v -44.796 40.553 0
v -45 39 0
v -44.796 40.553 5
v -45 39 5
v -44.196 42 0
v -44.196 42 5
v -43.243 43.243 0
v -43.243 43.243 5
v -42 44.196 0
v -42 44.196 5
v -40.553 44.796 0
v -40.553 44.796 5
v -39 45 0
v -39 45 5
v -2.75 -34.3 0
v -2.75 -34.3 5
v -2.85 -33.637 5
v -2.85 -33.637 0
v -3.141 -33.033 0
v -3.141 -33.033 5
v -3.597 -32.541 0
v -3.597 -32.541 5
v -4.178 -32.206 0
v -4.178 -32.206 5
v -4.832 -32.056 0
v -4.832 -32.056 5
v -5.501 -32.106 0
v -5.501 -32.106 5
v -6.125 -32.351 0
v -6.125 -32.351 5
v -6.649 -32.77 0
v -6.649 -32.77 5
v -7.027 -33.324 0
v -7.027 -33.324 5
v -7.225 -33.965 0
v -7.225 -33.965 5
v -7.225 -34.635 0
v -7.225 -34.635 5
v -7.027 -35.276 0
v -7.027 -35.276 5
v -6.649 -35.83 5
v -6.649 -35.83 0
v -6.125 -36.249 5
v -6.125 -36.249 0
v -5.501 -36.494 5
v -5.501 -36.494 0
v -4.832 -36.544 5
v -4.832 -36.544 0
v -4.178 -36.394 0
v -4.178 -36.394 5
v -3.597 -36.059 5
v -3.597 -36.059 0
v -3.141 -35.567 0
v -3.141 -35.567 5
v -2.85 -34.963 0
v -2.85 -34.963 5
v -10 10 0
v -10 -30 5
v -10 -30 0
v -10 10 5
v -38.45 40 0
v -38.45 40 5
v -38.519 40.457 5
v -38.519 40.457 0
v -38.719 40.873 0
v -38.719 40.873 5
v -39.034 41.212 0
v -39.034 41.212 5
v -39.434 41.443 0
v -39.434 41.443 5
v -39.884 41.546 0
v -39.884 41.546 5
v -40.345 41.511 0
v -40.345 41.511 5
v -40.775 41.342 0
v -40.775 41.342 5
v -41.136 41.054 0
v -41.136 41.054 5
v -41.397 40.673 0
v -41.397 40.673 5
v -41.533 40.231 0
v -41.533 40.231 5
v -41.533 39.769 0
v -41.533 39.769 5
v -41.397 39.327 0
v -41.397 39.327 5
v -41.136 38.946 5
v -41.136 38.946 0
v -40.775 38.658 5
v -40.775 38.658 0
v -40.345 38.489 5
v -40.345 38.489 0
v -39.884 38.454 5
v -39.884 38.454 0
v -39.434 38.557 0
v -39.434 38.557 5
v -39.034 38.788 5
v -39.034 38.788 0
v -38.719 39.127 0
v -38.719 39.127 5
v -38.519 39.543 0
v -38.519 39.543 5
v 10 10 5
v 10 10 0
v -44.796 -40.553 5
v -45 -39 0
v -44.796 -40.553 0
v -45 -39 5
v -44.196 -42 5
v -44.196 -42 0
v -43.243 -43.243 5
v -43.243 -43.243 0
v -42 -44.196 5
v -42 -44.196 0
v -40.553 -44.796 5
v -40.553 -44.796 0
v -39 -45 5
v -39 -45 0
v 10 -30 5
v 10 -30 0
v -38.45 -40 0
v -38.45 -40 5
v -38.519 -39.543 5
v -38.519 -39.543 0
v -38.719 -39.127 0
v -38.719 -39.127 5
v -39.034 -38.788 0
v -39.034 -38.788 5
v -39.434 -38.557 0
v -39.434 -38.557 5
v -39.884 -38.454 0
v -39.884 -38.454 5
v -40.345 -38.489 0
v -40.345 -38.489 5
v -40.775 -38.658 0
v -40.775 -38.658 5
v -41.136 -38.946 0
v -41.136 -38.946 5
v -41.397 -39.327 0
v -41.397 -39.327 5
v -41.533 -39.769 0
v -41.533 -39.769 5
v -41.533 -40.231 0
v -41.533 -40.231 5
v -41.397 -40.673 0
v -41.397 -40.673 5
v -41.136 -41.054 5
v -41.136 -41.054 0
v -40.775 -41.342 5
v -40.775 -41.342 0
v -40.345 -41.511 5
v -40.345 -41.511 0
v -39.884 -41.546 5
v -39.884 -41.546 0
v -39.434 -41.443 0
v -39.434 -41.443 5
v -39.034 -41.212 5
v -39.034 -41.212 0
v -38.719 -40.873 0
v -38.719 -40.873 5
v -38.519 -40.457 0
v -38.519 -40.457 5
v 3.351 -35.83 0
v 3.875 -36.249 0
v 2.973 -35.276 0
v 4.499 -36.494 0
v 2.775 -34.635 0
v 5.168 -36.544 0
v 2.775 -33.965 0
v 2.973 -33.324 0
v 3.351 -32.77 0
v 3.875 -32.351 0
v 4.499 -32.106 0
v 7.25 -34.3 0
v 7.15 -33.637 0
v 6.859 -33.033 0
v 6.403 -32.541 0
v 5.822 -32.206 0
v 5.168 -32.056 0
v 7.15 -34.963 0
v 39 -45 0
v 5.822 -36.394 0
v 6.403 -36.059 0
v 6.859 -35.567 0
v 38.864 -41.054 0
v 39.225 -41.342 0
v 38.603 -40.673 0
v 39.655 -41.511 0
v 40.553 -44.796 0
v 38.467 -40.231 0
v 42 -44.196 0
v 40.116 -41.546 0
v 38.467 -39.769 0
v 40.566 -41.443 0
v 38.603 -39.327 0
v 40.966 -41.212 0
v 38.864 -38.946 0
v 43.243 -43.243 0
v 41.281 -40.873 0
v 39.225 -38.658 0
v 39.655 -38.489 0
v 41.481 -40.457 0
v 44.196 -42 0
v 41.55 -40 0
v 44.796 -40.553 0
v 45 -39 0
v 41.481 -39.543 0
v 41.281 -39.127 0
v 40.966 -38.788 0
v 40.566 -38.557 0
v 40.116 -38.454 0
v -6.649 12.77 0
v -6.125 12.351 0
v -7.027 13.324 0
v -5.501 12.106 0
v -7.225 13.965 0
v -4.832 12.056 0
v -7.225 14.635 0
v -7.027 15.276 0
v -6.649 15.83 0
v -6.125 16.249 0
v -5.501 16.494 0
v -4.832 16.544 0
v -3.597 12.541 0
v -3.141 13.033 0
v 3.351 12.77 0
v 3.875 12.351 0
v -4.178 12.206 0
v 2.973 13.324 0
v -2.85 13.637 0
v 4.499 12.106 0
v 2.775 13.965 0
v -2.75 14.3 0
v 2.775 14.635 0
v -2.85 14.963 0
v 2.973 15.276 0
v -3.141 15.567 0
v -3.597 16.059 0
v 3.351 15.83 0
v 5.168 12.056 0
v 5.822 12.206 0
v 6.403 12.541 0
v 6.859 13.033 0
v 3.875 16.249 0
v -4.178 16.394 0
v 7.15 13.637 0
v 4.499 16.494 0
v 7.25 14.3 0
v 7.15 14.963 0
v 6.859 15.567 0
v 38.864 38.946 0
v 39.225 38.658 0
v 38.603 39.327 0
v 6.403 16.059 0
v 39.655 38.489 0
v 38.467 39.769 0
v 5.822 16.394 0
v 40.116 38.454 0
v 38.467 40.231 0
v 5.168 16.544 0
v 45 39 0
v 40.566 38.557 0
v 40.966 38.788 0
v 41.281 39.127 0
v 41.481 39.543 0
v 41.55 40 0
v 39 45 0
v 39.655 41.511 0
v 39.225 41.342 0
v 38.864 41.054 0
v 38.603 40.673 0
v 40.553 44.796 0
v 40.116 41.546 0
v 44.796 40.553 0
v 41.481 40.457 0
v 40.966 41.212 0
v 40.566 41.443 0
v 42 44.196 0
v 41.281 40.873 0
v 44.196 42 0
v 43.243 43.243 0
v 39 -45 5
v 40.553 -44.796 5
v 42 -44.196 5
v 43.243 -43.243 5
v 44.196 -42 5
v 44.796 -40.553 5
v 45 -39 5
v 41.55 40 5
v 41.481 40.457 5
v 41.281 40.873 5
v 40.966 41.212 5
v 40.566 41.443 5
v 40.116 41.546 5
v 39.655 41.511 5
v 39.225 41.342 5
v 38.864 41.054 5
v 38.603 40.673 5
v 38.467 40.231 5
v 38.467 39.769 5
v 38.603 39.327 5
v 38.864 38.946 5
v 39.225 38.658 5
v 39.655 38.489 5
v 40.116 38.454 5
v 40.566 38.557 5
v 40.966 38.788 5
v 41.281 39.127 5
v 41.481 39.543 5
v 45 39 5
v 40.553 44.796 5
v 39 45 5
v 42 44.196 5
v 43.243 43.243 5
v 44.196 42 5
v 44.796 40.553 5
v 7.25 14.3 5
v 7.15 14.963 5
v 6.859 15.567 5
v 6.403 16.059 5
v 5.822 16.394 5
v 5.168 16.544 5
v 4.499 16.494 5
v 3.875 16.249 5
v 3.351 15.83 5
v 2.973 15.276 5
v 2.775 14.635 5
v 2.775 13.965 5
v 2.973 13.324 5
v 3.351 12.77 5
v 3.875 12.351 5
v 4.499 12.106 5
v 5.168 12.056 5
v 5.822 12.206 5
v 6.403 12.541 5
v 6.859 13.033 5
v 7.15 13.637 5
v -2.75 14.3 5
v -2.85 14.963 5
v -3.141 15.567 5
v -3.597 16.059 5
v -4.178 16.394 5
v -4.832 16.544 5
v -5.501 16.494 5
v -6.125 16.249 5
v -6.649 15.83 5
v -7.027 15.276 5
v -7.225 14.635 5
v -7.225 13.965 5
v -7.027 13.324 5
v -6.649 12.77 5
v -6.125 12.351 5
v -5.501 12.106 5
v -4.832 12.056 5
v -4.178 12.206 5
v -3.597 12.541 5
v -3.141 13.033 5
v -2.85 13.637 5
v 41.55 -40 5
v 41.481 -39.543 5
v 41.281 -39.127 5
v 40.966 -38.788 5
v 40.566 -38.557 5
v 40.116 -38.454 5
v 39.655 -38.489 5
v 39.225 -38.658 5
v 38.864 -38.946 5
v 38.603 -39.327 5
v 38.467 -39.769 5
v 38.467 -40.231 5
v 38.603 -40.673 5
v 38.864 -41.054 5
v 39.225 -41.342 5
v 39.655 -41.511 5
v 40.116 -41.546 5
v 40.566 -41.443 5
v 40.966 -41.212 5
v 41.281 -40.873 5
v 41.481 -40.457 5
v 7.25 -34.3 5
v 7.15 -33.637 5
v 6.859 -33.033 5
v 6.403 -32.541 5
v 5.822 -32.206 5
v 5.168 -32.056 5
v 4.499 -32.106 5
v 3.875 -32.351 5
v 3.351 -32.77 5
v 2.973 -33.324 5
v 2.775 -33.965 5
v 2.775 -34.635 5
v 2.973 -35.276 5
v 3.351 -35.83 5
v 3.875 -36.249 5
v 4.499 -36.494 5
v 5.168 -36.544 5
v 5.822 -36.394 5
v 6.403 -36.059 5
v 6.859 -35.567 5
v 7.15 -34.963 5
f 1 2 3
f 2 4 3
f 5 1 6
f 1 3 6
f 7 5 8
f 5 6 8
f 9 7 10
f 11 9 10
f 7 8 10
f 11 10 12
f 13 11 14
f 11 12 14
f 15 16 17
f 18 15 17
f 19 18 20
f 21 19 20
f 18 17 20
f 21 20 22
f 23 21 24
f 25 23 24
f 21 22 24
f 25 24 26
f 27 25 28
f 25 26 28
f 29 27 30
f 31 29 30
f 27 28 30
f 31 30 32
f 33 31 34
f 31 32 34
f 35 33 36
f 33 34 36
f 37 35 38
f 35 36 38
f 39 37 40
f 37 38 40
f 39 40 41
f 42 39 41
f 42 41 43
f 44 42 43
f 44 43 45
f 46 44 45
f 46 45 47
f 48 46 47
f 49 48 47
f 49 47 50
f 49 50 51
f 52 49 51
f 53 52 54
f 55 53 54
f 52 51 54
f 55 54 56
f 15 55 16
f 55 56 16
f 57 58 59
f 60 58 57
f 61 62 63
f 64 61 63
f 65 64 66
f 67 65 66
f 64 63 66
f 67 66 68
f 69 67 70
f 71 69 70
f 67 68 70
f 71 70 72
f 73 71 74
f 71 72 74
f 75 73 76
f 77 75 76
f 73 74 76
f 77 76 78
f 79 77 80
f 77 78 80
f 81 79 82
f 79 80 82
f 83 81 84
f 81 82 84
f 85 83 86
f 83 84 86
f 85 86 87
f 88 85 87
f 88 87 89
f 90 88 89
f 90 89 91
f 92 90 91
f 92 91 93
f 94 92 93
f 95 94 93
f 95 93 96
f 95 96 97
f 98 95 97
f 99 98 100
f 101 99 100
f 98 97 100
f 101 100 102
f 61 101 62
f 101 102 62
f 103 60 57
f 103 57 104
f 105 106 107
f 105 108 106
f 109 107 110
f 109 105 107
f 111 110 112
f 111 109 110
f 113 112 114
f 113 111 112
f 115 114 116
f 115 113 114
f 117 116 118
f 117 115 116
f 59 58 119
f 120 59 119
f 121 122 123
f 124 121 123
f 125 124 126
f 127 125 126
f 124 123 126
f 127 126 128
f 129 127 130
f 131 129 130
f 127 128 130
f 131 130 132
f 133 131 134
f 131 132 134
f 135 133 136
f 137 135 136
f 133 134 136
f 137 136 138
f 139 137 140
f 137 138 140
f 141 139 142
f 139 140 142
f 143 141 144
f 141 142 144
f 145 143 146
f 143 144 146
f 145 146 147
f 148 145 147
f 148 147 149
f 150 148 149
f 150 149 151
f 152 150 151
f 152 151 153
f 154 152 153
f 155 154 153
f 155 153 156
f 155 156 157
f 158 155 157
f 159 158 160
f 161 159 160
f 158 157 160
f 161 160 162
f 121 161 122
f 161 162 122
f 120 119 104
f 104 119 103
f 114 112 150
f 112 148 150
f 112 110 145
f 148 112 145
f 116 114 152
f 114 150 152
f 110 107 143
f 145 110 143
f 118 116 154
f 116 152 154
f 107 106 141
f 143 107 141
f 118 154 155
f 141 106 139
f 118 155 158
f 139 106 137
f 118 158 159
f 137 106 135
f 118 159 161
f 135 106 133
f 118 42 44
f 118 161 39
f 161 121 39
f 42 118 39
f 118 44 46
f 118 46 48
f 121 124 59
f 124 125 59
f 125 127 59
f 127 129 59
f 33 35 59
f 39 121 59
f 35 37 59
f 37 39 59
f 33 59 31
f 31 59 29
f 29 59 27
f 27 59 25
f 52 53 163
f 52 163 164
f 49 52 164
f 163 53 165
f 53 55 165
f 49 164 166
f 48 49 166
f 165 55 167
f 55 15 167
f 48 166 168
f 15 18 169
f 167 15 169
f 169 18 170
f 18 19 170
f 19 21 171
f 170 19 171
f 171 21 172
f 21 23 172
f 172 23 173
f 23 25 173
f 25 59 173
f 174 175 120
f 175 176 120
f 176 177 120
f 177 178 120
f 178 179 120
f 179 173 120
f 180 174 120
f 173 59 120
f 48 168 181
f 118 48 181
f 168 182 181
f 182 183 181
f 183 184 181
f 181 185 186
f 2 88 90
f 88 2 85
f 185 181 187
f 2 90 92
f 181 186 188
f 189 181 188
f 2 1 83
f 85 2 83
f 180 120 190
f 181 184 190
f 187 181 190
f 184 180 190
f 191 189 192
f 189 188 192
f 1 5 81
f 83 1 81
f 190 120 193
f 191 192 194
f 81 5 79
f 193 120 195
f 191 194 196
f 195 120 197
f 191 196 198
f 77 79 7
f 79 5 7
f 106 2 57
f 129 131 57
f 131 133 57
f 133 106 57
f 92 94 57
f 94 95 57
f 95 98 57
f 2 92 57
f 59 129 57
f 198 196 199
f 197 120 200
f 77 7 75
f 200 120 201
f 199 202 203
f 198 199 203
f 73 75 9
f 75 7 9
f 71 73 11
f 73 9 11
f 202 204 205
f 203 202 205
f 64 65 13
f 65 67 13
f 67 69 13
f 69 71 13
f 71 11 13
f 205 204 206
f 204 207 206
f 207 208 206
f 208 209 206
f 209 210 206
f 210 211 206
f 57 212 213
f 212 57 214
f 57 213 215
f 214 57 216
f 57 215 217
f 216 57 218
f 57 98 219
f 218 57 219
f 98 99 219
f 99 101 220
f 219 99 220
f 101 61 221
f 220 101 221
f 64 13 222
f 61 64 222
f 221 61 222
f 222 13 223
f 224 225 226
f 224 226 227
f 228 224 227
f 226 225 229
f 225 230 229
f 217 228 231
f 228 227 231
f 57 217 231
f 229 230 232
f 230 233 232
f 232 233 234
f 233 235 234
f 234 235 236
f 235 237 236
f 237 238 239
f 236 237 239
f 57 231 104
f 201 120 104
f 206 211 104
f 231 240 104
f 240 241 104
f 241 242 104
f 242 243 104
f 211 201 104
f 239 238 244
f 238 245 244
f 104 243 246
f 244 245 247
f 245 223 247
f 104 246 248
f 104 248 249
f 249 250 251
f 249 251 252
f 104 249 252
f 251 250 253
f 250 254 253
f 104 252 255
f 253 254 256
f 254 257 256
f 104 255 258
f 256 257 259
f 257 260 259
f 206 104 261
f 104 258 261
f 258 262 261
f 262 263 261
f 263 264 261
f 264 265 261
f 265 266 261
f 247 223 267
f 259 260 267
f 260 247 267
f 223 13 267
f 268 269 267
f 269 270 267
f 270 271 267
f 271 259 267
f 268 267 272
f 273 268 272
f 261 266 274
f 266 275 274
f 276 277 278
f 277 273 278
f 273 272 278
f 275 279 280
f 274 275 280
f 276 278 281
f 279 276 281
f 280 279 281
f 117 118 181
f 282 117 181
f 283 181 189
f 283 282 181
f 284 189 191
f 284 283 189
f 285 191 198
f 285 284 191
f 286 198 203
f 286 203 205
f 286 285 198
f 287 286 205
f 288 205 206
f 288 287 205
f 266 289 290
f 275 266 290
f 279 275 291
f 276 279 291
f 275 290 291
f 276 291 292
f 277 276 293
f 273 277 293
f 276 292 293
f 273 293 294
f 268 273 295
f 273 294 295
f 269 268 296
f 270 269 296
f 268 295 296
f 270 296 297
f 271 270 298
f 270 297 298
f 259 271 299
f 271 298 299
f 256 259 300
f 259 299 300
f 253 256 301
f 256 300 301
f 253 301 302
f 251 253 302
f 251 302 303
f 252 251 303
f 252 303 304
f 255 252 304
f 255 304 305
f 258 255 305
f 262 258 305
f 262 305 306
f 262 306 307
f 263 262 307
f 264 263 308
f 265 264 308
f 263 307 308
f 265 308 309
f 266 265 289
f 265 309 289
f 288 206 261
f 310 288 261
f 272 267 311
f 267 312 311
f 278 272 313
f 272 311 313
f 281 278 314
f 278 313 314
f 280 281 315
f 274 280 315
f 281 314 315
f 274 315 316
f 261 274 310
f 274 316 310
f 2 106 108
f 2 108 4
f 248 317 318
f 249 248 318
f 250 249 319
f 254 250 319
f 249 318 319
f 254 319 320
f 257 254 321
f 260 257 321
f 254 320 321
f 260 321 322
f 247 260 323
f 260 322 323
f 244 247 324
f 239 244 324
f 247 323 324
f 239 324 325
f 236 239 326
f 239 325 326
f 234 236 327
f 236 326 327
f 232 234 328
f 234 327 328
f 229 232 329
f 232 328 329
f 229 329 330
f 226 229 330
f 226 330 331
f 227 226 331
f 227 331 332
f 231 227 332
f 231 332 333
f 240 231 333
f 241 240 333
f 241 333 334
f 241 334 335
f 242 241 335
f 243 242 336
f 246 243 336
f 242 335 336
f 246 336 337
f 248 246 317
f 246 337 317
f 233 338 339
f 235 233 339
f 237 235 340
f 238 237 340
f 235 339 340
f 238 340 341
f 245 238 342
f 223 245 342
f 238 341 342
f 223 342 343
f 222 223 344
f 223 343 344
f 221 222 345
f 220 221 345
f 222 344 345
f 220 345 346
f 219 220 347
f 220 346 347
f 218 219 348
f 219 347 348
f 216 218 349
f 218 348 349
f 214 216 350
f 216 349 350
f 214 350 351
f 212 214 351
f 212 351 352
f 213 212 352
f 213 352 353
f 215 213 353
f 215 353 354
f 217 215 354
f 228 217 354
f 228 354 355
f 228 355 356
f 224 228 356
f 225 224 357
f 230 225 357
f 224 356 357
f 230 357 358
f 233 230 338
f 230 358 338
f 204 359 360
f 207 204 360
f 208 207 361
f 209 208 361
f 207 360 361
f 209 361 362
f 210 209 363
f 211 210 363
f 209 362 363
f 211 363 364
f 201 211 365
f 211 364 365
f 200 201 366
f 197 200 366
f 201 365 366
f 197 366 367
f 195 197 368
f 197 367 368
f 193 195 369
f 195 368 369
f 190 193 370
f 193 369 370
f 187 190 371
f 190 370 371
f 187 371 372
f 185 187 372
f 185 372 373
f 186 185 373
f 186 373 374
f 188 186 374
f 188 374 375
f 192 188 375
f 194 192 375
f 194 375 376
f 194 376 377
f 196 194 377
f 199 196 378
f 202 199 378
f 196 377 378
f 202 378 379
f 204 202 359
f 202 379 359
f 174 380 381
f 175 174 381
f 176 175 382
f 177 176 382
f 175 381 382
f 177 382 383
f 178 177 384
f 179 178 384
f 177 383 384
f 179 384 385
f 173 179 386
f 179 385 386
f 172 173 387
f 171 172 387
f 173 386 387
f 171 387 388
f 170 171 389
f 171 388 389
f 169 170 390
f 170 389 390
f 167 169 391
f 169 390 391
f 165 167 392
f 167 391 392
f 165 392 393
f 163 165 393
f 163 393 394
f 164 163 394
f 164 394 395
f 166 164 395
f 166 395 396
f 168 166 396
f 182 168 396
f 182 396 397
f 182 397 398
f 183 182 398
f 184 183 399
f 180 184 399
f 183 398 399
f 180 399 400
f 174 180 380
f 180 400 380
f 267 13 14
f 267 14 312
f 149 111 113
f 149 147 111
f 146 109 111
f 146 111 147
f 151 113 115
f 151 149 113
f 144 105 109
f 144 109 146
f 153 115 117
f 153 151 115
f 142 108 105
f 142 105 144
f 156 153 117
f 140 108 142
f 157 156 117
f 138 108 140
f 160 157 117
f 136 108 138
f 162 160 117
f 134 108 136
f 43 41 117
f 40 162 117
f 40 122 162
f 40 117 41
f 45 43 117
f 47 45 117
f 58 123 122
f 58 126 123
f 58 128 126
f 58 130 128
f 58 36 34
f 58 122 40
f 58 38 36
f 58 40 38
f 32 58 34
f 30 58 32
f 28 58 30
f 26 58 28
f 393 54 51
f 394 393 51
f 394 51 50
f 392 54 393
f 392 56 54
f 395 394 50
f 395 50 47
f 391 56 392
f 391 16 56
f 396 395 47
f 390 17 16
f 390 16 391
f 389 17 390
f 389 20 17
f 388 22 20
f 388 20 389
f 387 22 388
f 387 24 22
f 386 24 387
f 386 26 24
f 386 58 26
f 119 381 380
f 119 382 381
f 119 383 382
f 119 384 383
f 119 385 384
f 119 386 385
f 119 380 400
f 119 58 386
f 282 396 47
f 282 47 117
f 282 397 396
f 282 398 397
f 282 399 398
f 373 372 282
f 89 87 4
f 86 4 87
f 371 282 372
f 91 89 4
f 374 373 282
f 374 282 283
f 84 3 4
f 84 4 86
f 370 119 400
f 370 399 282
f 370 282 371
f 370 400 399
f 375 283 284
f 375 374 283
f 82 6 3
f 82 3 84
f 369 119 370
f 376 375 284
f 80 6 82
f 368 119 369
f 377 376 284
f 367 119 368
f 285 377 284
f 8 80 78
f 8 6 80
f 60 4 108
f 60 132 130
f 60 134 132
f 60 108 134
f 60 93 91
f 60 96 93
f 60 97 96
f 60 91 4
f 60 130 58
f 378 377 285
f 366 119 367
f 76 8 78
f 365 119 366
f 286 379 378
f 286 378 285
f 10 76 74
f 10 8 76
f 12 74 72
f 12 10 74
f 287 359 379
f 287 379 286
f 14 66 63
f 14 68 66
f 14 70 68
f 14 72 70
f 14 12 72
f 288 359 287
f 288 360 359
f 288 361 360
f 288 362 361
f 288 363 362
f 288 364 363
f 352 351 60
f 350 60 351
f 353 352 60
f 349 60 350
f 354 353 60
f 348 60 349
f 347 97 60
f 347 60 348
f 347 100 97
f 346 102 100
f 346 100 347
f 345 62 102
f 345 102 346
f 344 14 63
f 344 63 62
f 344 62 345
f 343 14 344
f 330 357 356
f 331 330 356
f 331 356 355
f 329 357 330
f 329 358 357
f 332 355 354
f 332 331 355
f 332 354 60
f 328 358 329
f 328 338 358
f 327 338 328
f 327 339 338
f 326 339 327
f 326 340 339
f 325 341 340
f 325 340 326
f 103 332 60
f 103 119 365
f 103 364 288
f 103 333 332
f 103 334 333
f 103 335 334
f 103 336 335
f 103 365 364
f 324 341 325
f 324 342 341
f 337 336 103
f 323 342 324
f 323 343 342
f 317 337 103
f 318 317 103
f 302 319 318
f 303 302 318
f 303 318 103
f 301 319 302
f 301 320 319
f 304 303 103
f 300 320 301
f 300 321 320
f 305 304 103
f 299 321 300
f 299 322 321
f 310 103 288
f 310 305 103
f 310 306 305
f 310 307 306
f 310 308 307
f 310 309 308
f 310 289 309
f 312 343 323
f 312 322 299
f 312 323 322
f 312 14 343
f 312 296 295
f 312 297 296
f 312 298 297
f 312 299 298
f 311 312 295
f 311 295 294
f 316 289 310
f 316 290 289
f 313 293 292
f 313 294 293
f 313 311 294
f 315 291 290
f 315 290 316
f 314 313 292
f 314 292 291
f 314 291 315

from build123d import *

# Parameters (mm, degrees)
SKETCH_W        = 90
SKETCH_H        = 90
PAD_DEPTH       = 5
SKETCH001_R     = 1.55
POCKET_DEPTH    = 5
FILLET_R        = 6
SKETCH002_W     = 20
SKETCH002_H     = 40
POCKET001_DEPTH = 5
SKETCH003_R     = 2.25
POCKET002_DEPTH = 5


with BuildPart() as part:
    # Sketch → Pad (new body)
    with BuildSketch(Plane.XY):
        Rectangle(SKETCH_W, SKETCH_H)
    extrude(amount=PAD_DEPTH)

    # Sketch001 (on Face6 of Pad) → Pocket (cut)
    with BuildSketch(Plane.XY.offset(5)):
        with Locations((-40, 40)):
            Circle(SKETCH001_R)
        with Locations((40, 40)):
            Circle(SKETCH001_R)
        with Locations((40, -40)):
            Circle(SKETCH001_R)
        with Locations((-40, -40)):
            Circle(SKETCH001_R)
    extrude(amount=-POCKET_DEPTH, mode=Mode.SUBTRACT)

    # Fillet
    fillet_edges = [part.edges().sort_by_distance(p)[0] for p in [
        (-45, -45, 2.5),
        (45, -45, 2.5),
        (45, 45, 2.5),
        (-45, 45, 2.5),
    ]]
    fillet(fillet_edges, radius=FILLET_R)

    # Sketch002 (on Face5 of Fillet) → Pocket001 (cut)
    with BuildSketch(Plane.XY.offset(5)):
        with Locations((0, -10)):
            Rectangle(SKETCH002_W, SKETCH002_H)
    extrude(amount=-POCKET001_DEPTH, mode=Mode.SUBTRACT)

    # Sketch003 (on Face5 of Pocket001) → Pocket002 (cut)
    with BuildSketch(Plane.XY.offset(5)):
        with Locations((-5, 14.3)):
            Circle(SKETCH003_R)
        with Locations((5, 14.3)):
            Circle(SKETCH003_R)
        with Locations((-5, -34.3)):
            Circle(SKETCH003_R)
        with Locations((5, -34.3)):
            Circle(SKETCH003_R)
    extrude(amount=-POCKET002_DEPTH, mode=Mode.SUBTRACT)


solid = part.part
